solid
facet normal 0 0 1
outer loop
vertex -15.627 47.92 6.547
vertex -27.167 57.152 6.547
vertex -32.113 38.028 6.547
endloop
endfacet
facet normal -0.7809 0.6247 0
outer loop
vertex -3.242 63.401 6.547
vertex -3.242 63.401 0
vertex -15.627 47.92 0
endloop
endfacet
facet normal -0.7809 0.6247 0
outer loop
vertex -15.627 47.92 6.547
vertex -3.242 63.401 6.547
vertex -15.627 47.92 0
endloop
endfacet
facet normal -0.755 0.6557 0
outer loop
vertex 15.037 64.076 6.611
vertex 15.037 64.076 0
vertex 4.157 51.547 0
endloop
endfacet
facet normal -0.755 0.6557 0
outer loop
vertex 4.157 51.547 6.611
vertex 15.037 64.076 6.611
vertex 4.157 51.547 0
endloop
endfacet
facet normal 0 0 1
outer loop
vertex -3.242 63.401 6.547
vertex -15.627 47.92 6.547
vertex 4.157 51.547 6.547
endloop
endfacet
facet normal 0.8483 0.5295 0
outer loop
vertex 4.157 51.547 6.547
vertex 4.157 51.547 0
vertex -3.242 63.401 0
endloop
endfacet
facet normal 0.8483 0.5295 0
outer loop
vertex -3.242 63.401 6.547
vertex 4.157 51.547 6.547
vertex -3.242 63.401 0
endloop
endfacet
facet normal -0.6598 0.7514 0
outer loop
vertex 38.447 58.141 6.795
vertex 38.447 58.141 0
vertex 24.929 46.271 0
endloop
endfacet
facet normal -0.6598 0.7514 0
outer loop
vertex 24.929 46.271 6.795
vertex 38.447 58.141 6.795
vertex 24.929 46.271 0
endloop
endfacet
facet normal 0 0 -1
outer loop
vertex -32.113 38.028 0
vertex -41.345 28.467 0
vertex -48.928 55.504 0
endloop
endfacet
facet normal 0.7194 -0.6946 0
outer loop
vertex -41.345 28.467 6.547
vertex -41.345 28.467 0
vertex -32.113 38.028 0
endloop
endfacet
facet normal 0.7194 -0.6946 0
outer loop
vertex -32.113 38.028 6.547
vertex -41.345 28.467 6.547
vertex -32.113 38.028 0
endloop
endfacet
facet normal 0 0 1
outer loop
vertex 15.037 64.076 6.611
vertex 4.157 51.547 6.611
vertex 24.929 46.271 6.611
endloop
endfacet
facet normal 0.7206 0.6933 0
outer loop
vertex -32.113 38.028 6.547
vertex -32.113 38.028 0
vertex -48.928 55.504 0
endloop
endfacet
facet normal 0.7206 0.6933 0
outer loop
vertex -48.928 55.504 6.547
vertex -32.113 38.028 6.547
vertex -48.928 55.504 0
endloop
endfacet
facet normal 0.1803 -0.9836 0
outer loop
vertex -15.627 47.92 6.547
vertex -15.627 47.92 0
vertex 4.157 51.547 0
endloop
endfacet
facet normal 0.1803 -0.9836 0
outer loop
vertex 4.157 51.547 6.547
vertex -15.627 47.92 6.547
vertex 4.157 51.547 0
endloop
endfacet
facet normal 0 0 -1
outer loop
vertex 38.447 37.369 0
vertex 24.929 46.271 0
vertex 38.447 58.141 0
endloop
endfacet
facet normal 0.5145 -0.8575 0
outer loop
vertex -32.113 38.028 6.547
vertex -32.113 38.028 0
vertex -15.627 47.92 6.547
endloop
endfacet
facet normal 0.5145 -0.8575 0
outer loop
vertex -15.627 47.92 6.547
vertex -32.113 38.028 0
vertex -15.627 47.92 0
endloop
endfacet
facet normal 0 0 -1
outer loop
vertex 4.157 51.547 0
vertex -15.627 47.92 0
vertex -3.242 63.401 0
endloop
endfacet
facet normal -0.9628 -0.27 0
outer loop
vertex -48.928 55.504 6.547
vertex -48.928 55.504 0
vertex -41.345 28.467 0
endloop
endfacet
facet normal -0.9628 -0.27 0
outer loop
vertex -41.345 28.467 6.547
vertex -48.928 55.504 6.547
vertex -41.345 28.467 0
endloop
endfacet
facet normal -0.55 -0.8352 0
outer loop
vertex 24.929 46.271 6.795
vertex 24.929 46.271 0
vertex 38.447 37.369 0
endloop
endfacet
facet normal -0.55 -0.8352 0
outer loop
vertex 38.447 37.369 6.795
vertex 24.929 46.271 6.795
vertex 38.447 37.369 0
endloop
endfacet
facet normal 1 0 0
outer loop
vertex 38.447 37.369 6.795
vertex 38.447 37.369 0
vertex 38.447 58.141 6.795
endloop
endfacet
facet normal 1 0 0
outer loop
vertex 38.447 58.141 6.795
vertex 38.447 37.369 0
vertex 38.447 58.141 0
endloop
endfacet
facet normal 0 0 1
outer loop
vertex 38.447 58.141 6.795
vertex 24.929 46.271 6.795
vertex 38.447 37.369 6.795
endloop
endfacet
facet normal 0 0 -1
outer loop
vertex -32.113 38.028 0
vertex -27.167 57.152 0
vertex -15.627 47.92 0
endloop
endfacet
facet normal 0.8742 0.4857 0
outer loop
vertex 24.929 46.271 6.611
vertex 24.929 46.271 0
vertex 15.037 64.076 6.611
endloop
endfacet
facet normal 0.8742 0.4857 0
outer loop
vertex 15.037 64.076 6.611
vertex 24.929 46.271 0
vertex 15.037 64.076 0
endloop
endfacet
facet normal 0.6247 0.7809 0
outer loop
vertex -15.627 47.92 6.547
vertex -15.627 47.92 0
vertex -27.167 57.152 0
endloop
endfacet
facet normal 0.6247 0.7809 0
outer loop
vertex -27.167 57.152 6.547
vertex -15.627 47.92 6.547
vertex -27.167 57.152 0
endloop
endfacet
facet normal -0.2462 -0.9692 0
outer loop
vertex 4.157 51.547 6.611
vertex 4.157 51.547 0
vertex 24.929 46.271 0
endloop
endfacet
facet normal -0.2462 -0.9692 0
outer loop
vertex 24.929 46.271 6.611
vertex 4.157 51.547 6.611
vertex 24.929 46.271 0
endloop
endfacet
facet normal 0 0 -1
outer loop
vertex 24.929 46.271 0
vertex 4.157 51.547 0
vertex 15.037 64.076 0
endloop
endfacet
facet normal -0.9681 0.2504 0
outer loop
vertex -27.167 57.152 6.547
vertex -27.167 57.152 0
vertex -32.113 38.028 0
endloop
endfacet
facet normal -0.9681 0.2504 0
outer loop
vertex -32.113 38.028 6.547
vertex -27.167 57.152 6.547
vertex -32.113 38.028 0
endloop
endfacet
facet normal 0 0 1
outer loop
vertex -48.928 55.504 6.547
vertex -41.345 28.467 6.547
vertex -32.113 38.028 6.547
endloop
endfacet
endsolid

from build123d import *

# Parameters (mm, degrees)
F1_DEPTH = 6.54674
F2_DEPTH = 6.54673
F3_DEPTH = 6.54673
F4_DEPTH = 6.61096
F5_DEPTH = 6.79529


with BuildPart() as f1:
    # F0 (on Top) → F1 (new body)
    with BuildSketch(Plane.XY):
        Polygon((-48.928399, 55.503596), (-41.34484, 28.466551), (-32.112677, 38.028438), align=None)
    extrude(amount=F1_DEPTH)


with BuildPart() as f2:
    # F0 (on Top) → F2 (new body)
    with BuildSketch(Plane.XY):
        Polygon((-27.166875, 57.152204), (-32.112677, 38.028438), (-15.626675, 47.920037), align=None)
    extrude(amount=F2_DEPTH)


with BuildPart() as f3:
    # F0 (on Top) → F3 (new body)
    with BuildSketch(Plane.XY):
        Polygon((-3.242057, 63.400797), (-15.626675, 47.920037), (4.156529, 51.546957), align=None)
    extrude(amount=F3_DEPTH)


with BuildPart() as f4:
    # F0 (on Top) → F4 (new body)
    with BuildSketch(Plane.XY):
        Polygon((15.037294, 64.076327), (4.156529, 51.546957), (24.928892, 46.271436), align=None)
    extrude(amount=F4_DEPTH)


with BuildPart() as f5:
    # F0 (on Top) → F5 (new body)
    with BuildSketch(Plane.XY):
        Polygon((38.447417, 58.141362), (24.928892, 46.271436), (38.447417, 37.368998), align=None)
    extrude(amount=F5_DEPTH)


solid = Compound([f1.part, f2.part, f3.part, f4.part, f5.part])
